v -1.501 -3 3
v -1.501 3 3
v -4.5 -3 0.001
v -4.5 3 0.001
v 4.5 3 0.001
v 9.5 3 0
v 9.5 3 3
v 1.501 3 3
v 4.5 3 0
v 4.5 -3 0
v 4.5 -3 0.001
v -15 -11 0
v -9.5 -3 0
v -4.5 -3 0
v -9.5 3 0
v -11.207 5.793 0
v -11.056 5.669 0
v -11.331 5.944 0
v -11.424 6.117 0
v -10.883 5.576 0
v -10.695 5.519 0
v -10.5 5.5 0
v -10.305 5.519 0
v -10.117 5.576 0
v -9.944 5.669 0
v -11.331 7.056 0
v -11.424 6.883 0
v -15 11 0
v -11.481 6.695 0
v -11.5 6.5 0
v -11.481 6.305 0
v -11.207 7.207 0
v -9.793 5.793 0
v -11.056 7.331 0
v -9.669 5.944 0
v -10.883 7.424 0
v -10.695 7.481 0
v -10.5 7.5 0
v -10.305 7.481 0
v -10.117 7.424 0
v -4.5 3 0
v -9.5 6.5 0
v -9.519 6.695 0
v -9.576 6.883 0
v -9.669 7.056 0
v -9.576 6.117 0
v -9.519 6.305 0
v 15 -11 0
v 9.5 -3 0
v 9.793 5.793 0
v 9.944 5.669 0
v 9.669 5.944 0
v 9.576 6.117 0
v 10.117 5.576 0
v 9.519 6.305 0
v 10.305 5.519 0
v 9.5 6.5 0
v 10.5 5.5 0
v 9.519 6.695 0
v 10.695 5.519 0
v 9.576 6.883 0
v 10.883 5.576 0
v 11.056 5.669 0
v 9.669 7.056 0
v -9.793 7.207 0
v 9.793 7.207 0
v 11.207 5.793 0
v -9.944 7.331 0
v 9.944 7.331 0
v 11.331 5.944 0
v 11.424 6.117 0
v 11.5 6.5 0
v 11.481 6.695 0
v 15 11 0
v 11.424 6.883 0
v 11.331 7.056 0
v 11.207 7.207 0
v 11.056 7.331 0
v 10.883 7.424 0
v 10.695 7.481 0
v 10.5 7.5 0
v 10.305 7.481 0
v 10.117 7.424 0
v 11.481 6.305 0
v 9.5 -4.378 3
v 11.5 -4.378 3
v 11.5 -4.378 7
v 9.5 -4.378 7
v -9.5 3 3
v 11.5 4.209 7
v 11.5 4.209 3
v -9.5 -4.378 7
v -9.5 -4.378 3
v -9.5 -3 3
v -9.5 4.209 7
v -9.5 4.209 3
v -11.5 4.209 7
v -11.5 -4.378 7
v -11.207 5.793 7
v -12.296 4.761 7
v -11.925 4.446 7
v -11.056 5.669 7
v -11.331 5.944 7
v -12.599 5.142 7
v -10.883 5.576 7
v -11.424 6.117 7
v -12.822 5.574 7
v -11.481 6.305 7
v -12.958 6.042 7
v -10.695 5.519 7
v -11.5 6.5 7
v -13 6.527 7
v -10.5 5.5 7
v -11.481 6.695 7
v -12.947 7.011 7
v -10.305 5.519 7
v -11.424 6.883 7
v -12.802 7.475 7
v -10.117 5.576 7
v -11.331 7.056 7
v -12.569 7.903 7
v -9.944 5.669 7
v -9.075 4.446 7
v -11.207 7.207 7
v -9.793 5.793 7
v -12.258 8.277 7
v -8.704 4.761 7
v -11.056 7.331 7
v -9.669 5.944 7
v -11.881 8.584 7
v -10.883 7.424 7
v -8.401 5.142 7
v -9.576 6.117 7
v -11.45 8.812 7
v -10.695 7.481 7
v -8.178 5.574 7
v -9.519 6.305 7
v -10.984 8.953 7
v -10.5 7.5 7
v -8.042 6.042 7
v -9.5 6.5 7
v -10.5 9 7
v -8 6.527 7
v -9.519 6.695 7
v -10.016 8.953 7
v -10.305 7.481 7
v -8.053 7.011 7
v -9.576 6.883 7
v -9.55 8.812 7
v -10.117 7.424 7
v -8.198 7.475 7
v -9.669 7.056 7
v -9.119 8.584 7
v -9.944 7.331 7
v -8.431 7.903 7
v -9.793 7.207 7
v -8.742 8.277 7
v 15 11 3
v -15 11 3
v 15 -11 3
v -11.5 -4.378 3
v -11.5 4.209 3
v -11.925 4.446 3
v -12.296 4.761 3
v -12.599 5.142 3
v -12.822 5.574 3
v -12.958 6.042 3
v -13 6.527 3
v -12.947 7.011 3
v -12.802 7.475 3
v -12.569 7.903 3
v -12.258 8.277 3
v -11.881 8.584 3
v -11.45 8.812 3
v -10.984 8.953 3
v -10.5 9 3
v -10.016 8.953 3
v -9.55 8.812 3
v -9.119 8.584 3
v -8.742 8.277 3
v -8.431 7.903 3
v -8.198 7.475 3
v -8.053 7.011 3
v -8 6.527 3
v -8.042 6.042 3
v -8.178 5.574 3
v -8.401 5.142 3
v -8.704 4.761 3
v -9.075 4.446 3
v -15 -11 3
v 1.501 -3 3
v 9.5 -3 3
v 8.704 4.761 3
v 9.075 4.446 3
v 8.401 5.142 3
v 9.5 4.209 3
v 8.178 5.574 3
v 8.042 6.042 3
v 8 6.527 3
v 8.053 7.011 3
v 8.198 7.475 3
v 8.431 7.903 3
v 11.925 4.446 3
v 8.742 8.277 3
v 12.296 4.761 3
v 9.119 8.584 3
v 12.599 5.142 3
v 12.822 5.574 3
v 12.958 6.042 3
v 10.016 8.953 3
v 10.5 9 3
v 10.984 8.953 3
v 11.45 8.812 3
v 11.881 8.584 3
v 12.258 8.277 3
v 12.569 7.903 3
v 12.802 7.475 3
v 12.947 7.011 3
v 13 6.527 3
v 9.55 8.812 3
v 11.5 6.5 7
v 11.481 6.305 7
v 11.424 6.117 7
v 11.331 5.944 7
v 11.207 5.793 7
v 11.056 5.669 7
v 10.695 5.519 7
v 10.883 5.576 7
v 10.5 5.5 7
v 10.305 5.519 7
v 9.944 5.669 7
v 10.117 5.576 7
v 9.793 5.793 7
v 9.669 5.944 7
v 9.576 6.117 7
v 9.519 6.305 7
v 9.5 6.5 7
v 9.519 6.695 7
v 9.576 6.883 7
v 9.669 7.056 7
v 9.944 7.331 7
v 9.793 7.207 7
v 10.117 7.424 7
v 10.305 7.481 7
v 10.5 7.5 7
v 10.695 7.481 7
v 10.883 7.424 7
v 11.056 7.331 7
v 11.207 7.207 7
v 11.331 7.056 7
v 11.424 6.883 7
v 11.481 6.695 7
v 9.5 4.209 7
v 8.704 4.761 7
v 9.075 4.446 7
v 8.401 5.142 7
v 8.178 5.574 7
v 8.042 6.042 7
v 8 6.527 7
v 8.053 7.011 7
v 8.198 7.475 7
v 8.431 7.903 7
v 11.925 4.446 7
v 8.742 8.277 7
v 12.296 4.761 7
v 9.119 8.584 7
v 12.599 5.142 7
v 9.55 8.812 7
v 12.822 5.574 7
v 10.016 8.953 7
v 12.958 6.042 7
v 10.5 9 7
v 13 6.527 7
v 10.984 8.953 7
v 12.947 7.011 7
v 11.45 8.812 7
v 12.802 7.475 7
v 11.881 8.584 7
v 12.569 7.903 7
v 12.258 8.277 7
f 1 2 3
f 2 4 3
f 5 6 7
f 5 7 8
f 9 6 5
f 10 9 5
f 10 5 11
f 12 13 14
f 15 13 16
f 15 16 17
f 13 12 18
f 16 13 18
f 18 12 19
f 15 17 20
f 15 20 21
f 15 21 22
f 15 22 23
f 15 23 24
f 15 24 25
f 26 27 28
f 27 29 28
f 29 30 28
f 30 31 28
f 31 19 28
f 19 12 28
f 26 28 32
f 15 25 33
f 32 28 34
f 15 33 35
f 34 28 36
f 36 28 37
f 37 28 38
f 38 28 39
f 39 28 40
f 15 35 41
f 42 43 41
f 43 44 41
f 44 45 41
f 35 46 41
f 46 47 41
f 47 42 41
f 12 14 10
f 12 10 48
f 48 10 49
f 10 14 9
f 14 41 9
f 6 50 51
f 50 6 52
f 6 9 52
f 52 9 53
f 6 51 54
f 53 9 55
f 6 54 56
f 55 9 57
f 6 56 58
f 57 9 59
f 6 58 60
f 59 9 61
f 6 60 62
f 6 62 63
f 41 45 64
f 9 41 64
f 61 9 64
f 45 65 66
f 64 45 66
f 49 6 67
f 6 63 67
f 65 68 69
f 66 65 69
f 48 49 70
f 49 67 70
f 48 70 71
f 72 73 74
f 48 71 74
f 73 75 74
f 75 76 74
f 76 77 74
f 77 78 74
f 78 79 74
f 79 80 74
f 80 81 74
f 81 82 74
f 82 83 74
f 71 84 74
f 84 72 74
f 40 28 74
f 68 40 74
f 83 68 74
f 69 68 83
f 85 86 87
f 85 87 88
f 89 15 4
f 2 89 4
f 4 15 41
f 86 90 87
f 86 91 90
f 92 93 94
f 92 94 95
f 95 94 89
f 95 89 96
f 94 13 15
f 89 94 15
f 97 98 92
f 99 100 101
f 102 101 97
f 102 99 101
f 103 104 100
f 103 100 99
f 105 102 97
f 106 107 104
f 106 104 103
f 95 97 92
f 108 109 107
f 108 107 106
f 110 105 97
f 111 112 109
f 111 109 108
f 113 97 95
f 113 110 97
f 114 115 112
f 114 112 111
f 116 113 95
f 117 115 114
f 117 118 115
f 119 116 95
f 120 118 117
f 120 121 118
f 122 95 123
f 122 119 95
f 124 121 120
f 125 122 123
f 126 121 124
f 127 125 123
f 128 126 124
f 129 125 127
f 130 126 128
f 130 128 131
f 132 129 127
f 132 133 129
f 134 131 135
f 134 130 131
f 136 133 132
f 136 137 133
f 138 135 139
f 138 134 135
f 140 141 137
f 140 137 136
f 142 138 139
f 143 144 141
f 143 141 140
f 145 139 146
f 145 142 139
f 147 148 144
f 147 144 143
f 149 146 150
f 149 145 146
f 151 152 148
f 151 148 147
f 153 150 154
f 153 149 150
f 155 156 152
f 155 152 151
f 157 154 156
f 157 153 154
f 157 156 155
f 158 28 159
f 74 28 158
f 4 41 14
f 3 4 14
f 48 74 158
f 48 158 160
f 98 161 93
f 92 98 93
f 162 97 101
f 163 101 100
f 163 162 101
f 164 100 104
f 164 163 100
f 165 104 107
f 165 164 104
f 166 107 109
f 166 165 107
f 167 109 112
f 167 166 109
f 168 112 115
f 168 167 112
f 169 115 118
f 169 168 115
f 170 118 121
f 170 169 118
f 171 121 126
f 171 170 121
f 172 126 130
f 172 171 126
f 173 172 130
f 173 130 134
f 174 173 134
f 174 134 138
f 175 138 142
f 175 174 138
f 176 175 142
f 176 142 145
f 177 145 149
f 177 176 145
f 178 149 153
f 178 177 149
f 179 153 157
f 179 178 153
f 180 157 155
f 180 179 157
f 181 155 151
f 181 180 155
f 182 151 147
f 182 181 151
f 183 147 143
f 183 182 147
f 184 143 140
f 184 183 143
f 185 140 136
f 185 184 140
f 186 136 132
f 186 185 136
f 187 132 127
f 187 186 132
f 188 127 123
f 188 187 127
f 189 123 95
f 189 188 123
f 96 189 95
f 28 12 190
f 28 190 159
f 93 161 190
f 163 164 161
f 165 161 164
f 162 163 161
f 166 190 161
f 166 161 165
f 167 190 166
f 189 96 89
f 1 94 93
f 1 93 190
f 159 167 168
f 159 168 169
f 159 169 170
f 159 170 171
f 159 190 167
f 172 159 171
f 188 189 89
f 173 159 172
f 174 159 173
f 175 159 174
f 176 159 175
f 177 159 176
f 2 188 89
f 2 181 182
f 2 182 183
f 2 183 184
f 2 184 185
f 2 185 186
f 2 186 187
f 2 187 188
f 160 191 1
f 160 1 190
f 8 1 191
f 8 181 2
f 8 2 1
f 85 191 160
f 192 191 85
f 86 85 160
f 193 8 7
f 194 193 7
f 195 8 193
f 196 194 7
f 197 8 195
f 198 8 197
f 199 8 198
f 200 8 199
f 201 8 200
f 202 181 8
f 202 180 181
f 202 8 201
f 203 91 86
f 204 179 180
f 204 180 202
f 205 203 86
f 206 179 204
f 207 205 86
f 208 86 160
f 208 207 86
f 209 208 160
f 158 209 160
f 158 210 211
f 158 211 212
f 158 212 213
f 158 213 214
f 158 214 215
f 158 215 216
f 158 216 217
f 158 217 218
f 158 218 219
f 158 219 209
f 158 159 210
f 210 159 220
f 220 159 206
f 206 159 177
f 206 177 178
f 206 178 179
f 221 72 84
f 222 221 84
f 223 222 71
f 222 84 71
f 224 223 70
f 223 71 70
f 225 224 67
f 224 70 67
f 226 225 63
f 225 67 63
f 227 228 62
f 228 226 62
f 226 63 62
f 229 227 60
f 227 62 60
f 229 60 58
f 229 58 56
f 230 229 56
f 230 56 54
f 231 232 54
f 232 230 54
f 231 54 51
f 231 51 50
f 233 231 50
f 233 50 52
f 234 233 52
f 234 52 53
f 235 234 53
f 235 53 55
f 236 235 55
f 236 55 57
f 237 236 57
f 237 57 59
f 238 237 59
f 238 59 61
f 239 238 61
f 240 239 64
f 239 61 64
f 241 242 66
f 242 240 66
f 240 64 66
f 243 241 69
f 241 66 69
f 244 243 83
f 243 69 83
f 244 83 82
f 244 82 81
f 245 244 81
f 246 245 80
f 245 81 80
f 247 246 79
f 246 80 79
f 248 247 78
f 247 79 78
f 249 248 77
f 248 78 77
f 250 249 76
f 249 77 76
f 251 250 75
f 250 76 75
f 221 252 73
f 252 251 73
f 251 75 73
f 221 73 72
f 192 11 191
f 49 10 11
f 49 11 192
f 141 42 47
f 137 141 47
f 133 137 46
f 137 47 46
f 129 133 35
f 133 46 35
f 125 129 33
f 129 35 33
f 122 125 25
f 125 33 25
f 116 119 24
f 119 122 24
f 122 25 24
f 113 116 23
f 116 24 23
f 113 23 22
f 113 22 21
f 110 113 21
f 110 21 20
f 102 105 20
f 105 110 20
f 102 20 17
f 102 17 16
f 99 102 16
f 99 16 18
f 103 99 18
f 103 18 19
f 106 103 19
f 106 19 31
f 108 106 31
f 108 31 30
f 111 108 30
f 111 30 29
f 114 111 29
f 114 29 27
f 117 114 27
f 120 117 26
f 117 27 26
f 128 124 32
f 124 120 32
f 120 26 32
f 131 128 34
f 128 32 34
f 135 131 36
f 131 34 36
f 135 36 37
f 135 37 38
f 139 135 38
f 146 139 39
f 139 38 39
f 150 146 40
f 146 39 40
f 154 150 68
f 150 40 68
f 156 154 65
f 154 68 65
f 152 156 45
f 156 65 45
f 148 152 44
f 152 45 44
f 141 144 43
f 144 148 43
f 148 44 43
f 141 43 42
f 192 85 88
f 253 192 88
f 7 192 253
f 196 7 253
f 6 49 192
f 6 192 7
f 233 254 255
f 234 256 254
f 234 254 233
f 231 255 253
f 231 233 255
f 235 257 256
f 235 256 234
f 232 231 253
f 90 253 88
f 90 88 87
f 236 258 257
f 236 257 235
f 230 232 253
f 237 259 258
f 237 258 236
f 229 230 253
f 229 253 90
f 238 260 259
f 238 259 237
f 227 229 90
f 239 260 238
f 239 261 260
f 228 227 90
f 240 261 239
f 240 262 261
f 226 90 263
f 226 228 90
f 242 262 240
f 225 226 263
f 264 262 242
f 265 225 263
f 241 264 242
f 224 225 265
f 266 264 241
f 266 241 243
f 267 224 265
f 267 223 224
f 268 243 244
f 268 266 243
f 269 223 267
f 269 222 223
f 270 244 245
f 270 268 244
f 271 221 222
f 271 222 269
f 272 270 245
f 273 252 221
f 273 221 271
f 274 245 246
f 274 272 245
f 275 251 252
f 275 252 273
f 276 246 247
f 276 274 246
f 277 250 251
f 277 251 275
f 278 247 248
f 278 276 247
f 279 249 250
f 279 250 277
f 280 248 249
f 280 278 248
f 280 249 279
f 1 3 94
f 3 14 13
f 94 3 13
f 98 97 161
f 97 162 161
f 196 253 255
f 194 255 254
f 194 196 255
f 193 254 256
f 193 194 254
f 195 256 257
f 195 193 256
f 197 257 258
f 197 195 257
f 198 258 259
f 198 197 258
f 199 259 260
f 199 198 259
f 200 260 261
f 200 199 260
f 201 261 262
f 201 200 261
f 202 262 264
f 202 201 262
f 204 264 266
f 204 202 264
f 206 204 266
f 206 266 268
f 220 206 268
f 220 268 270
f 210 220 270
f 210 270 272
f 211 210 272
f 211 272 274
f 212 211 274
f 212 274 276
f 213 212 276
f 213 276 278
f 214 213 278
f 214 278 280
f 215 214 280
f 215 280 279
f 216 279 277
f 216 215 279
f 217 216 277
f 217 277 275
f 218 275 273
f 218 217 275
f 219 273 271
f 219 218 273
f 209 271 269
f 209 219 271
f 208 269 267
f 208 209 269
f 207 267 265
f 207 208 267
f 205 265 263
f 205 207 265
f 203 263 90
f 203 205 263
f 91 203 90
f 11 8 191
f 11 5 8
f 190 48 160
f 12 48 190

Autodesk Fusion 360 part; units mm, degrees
sketch "Schizzo1" plane through (0, 0, 0) normal (0, 0, 1) x (1, 0, 0)
  line L0 (15, -11) -> (-15, -11)
  line L1 (-15, -11) -> (-15, 11)
  line L2 (-15, 11) -> (15, 11)
  line L3 (15, 11) -> (15, -11)
  line L4 (15, -11) -> (-15, 11) construction
  line L5 (-15, -11) -> (15, 11) construction
  circle A0 centre (-10.5, 6.5) radius 1
  line L6 (0, 0) -> (0, 29.5876)
  circle A1 centre (10.5, 6.5) radius 1
  line L7 (-4.5, -3) -> (-9.5, -3)
  line L8 (-9.5, -3) -> (-9.5, 3)
  line L9 (-9.5, 3) -> (-4.5, 3)
  line L10 (-4.5, 3) -> (-4.5, -3)
  line L11 (-4.5, -3) -> (-9.5, 3) construction
  line L12 (-9.5, -3) -> (-4.5, 3) construction
  line L13 (4.5, -3) -> (9.5, -3)
  line L14 (9.5, -3) -> (9.5, 3)
  line L15 (9.5, 3) -> (4.5, 3)
  line L16 (4.5, 3) -> (4.5, -3)
  circle A2 centre (-10.5, 6.5) radius 2.5
  circle A3 centre (10.5, 6.5) radius 2.5
  line L17 (-9.5, 4.3778) -> (-11.5, 4.3778)
  line L18 (-11.5, 4.3778) -> (-11.5, -4.3778)
  line L19 (-11.5, -4.3778) -> (-9.5, -4.3778)
  line L20 (-9.5, -4.3778) -> (-9.5, 4.3778)
  line L21 (-9.5, 4.3778) -> (-11.5, -4.3778) construction
  line L22 (-11.5, 4.3778) -> (-9.5, -4.3778) construction
  line L23 (9.5, 4.3778) -> (11.5, 4.3778)
  line L24 (11.5, -4.3778) -> (9.5, -4.3778)
  line L25 (11.5, 4.3778) -> (11.5, -4.3778)
  line L26 (9.5, -3) -> (9.5, 3)
  line L27 (9.5, -4.3778) -> (9.5, 4.3778)
  point P0 (-7, 0)
  point P1 (-10.5, 0)
  dimension "d1" = 30
  dimension "d2" = 22
  dimension "d3" = 2
  dimension "d4" = 10.5
  dimension "d6" = 4.5
  dimension "d7" = 4.5
  dimension "d8" = 5
  dimension "d9" = 6
  dimension "d10" = 5
  dimension "d11" = 5
  dimension "d12" = 2
  dimension "d13" = 8.7557
  dimension "d14" = 10.5
extrude "Estrusione1" add sketch "Schizzo1" along normal blind 3 contours L0 L1 L2 L3 | L8 A2 L18 L19 L20 | A2 L17 L18 L20 | A2 L17 L18 L20 | L14 A3 L24 L25 L26 L27 | A3 L23 L25 L27 | A3 L23 L25 L27
extrude "Estrusione2" add sketch "Schizzo1" along normal blind 4 from surface at 3 contours L8 A2 L18 L19 L20 | A2 L17 L18 L20 | A2 L17 L18 L20 | L14 A3 L24 L25 L26 L27 | A3 L23 L25 L27 | A3 L23 L25 L27
chamfer "Smusso1" distance 3 angle 45 2 edges at (-4.5, 0, 3) (4.5, 0, 3)
equation "d4 = ( 21 / 2 ) * 1 mm"
equation "d14 = ( 21 / 2 ) * 1 mm"
